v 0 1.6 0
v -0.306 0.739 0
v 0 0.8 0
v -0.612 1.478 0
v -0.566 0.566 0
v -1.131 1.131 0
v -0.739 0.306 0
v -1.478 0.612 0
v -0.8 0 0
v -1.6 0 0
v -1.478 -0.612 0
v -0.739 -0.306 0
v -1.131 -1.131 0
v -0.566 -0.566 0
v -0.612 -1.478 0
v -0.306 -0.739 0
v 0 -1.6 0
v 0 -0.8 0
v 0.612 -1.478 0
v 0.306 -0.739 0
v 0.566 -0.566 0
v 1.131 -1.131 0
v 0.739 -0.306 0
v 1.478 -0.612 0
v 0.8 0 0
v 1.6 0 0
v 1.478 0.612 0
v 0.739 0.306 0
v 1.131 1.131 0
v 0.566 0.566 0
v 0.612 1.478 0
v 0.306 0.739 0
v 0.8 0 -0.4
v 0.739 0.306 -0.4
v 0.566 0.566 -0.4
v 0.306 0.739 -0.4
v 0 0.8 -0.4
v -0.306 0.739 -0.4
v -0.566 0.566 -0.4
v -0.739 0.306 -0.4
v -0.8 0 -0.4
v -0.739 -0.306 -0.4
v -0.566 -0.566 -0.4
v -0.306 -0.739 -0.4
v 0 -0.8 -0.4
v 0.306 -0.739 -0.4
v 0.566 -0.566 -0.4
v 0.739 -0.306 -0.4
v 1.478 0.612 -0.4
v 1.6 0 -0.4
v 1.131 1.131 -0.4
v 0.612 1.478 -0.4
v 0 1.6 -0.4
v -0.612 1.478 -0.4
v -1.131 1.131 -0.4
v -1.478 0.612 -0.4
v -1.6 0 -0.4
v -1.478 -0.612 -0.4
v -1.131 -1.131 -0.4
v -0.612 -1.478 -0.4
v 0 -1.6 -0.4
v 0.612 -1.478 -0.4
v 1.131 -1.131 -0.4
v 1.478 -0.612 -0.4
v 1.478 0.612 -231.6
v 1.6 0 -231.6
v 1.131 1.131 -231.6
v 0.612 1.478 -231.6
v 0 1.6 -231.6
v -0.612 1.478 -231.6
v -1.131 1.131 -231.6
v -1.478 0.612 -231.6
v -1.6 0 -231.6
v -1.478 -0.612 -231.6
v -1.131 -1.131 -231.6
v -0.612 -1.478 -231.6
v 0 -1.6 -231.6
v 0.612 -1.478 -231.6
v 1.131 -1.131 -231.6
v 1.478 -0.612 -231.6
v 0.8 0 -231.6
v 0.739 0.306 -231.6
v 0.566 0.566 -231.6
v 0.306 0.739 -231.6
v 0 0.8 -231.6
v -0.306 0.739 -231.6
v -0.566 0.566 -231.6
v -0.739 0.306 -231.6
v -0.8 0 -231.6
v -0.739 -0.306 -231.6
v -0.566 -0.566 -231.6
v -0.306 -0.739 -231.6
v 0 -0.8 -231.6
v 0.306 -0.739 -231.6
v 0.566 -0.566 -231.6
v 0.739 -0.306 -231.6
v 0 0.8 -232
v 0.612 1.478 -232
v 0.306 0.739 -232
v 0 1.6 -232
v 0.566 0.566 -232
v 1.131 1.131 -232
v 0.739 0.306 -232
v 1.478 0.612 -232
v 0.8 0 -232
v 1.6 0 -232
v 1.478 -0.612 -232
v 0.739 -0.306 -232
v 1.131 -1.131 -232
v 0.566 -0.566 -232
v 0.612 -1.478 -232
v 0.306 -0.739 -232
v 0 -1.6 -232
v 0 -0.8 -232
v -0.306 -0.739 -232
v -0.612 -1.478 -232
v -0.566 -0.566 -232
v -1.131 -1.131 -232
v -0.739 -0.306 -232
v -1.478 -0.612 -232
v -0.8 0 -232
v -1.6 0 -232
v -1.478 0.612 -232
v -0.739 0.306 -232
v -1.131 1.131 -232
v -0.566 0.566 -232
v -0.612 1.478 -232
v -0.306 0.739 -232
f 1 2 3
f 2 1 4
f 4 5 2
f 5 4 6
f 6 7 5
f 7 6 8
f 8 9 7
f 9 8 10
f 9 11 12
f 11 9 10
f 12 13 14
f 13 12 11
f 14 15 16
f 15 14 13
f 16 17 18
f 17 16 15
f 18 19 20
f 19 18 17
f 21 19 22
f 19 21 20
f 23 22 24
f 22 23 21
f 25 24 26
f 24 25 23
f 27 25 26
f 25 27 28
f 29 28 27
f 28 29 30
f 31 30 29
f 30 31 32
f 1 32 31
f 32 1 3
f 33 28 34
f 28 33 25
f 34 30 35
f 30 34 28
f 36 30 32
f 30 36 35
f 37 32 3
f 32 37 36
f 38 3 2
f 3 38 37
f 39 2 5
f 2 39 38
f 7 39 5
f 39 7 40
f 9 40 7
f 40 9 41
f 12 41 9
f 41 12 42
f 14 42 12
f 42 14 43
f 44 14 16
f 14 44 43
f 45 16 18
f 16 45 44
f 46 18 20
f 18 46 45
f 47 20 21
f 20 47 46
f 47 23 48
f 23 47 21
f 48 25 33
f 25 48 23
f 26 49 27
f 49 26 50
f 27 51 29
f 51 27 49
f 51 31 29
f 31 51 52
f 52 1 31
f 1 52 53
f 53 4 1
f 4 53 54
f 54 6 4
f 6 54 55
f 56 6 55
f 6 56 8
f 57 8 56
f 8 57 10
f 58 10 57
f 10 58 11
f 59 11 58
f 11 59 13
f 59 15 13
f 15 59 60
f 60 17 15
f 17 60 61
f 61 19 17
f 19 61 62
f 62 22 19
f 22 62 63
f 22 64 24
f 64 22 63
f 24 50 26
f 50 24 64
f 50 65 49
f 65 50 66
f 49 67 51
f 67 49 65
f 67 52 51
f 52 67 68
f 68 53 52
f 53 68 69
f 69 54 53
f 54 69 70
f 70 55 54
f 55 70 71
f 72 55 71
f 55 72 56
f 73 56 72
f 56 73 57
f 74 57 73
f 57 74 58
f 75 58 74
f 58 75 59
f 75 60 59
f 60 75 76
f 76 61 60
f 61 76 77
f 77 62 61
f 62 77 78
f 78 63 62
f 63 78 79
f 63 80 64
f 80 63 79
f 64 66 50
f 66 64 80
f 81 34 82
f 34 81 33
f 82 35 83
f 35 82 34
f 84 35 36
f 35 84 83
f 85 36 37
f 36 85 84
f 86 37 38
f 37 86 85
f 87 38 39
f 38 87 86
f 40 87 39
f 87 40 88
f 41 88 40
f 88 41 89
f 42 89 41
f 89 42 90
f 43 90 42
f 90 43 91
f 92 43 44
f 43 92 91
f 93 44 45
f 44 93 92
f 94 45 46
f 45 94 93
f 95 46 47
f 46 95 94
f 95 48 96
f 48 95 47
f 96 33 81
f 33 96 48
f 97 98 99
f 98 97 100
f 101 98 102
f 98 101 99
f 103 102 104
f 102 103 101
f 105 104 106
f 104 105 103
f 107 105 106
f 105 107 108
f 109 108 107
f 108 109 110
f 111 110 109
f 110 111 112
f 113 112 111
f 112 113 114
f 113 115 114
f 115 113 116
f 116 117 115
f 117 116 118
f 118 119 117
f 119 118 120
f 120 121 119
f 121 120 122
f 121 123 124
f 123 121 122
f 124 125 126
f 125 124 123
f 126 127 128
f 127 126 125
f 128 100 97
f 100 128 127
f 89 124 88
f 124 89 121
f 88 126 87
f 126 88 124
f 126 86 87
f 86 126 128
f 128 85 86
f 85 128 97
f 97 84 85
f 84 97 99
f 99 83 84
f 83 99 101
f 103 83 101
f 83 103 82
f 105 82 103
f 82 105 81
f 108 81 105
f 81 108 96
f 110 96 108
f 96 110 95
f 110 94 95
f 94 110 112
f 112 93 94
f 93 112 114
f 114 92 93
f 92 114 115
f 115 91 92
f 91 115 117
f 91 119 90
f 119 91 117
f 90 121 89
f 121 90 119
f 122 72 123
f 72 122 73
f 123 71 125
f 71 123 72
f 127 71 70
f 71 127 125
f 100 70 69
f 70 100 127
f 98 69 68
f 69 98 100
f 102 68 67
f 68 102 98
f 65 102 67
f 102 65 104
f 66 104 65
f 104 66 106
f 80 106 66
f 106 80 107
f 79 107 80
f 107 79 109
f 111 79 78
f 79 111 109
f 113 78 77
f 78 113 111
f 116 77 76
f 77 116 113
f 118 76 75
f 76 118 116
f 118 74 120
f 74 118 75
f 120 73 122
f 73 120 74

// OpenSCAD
// file: ../p/4-4ring1.scad
use <../lib.scad>
function ldraw_lib__4_4ring1() = [
// 0 Ring  1 x 1.0
// 0 Name: 4-4ring1.dat
// 0 Author: James Jessiman
// 0 !LDRAW_ORG Primitive UPDATE 2009-01
// 0 !LICENSE Licensed under CC BY 4.0 : see CAreadme.txt
// 
// 0 BFC CERTIFY CCW
  [0,"BFC","CERTIFY"],
  [0,"BFC","CCW"],
// 
// 0 !HISTORY 1998-12-15 [PTadmin] Official Update 1998-10
// 0 !HISTORY 2002-04-08 [BrickCaster] Modified for BFC compliance
// 0 !HISTORY 2002-04-25 [PTadmin] Official Update 2002-02
// 0 !HISTORY 2007-06-24 [PTadmin] Header formatted for Contributor Agreement
// 0 !HISTORY 2008-07-01 [PTadmin] Official Update 2008-01
// 0 !HISTORY 2008-08-26 [cwdee] Switch polygon winding and rename
// 0 !HISTORY 2009-05-02 [PTadmin] Official Update 2009-01
// 
// 
// 4 16 -0.7654 0 1.8478 -0.3827 0 0.9239 0 0 1 0 0 2
  [4,16,-0.7654,0,1.8478,-0.3827,0,0.9239,0,0,1,0,0,2],
// 4 16 -1.4142 0 1.4142 -0.7071 0 0.7071 -0.3827 0 0.9239 -0.7654 0 1.8478
  [4,16,-1.4142,0,1.4142,-0.7071,0,0.7071,-0.3827,0,0.9239,-0.7654,0,1.8478],
// 4 16 -1.8478 0 0.7654 -0.9239 0 0.3827 -0.7071 0 0.7071 -1.4142 0 1.41420
  [4,16,-1.8478,0,0.7654,-0.9239,0,0.3827,-0.7071,0,0.7071,-1.4142,0,1.41420],
// 4 16 -2 0 0 -1 0 0 -0.9239 0 0.3827 -1.8478 0 0.7654
  [4,16,-2,0,0,-1,0,0,-0.9239,0,0.3827,-1.8478,0,0.7654],
// 4 16 -1.8478 0 -0.7654 -0.9239 0 -0.3827 -1 0 0 -2 0 0
  [4,16,-1.8478,0,-0.7654,-0.9239,0,-0.3827,-1,0,0,-2,0,0],
// 4 16 -1.4142 0 -1.4142 -0.7071 0 -0.7071 -0.9239 0 -0.3827 -1.8478 0 -0.7654
  [4,16,-1.4142,0,-1.4142,-0.7071,0,-0.7071,-0.9239,0,-0.3827,-1.8478,0,-0.7654],
// 4 16 -0.7654 0 -1.8478 -0.3827 0 -0.9239 -0.7071 0 -0.7071 -1.4142 0 -1.4142
  [4,16,-0.7654,0,-1.8478,-0.3827,0,-0.9239,-0.7071,0,-0.7071,-1.4142,0,-1.4142],
// 4 16 0 0 -2 0 0 -1 -0.3827 0 -0.9239 -0.7654 0 -1.8478
  [4,16,0,0,-2,0,0,-1,-0.3827,0,-0.9239,-0.7654,0,-1.8478],
// 4 16 0.7654 0 -1.8478 0.3827 0 -0.9239 0 0 -1 0 0 -2
  [4,16,0.7654,0,-1.8478,0.3827,0,-0.9239,0,0,-1,0,0,-2],
// 4 16 1.4142 0 -1.4142 0.7071 0 -0.7071 0.3827 0 -0.9239 0.7654 0 -1.8478
  [4,16,1.4142,0,-1.4142,0.7071,0,-0.7071,0.3827,0,-0.9239,0.7654,0,-1.8478],
// 4 16 1.8478 0 -0.7654 0.9239 0 -0.3827 0.7071 0 -0.7071 1.4142 0 -1.4142
  [4,16,1.8478,0,-0.7654,0.9239,0,-0.3827,0.7071,0,-0.7071,1.4142,0,-1.4142],
// 4 16 2 0 0 1 0 0 0.9239 0 -0.3827 1.8478 0 -0.7654
  [4,16,2,0,0,1,0,0,0.9239,0,-0.3827,1.8478,0,-0.7654],
// 4 16 1.8478 0 0.7654 0.9239 0 0.3827 1 0 0 2 0 0
  [4,16,1.8478,0,0.7654,0.9239,0,0.3827,1,0,0,2,0,0],
// 4 16 1.4142 0 1.4142 0.7071 0 0.7071 0.9239 0 0.3827 1.8478 0 0.7654
  [4,16,1.4142,0,1.4142,0.7071,0,0.7071,0.9239,0,0.3827,1.8478,0,0.7654],
// 4 16 0.7654 0 1.8478 0.3827 0 0.9239 0.7071 0 0.7071 1.4142 0 1.4142
  [4,16,0.7654,0,1.8478,0.3827,0,0.9239,0.7071,0,0.7071,1.4142,0,1.4142],
// 4 16 0 0 2 0 0 1 0.3827 0 0.9239 0.7654 0 1.8478
  [4,16,0,0,2,0,0,1,0.3827,0,0.9239,0.7654,0,1.8478],
// 0
];
module ldraw_lib__4_4ring1(step=0, col=false, unit=2/5, alt=false, line=0.2, solid=!$preview)
    makepoly(ldraw_lib__4_4ring1(), step=step, col=col, unit=unit, alt=alt, line=line, solid=solid);
ldraw_lib__4_4ring1(line=0.2);
// file: ../p/4-4edge.scad
use <../lib.scad>
function ldraw_lib__4_4edge() = [
// 0 Circle 1.0
// 0 Name: 4-4edge.dat
// 0 Author: James Jessiman
// 0 !LDRAW_ORG Primitive UPDATE 2017-01
// 0 !LICENSE Licensed under CC BY 4.0 : see CAreadme.txt
// 
// 0 BFC CERTIFY CCW
  [0,"BFC","CERTIFY"],
  [0,"BFC","CCW"],
// 
// 0 !HISTORY 1998-12-15 [PTadmin] Official Update 1998-10
// 0 !HISTORY 2005-12-28 [PTadmin] Official Update 2005-01
// 0 !HISTORY 2007-06-24 [PTadmin] Header formatted for Contributor Agreement
// 0 !HISTORY 2008-07-01 [PTadmin] Official Update 2008-01
// 0 !HISTORY 2017-01-15 [Steffen] BFCed
// 0 !HISTORY 2017-12-30 [PTadmin] Official Update 2017-01
// 
// 
// 2 24 1 0 0 0.9239 0 0.3827
  [2,24,1,0,0,0.9239,0,0.3827],
// 2 24 0.9239 0 0.3827 0.7071 0 0.7071
  [2,24,0.9239,0,0.3827,0.7071,0,0.7071],
// 2 24 0.7071 0 0.7071 0.3827 0 0.9239
  [2,24,0.7071,0,0.7071,0.3827,0,0.9239],
// 2 24 0.3827 0 0.9239 0 0 1
  [2,24,0.3827,0,0.9239,0,0,1],
// 2 24 0 0 1 -0.3827 0 0.9239
  [2,24,0,0,1,-0.3827,0,0.9239],
// 2 24 -0.3827 0 0.9239 -0.7071 0 0.7071
  [2,24,-0.3827,0,0.9239,-0.7071,0,0.7071],
// 2 24 -0.7071 0 0.7071 -0.9239 0 0.3827
  [2,24,-0.7071,0,0.7071,-0.9239,0,0.3827],
// 2 24 -0.9239 0 0.3827 -1 0 -0
  [2,24,-0.9239,0,0.3827,-1,0,-0],
// 2 24 -1 0 -0 -0.9239 0 -0.3827
  [2,24,-1,0,-0,-0.9239,0,-0.3827],
// 2 24 -0.9239 0 -0.3827 -0.7071 0 -0.7071
  [2,24,-0.9239,0,-0.3827,-0.7071,0,-0.7071],
// 2 24 -0.7071 0 -0.7071 -0.3827 0 -0.9239
  [2,24,-0.7071,0,-0.7071,-0.3827,0,-0.9239],
// 2 24 -0.3827 0 -0.9239 0 0 -1
  [2,24,-0.3827,0,-0.9239,0,0,-1],
// 2 24 0 0 -1 0.3827 0 -0.9239
  [2,24,0,0,-1,0.3827,0,-0.9239],
// 2 24 0.3827 0 -0.9239 0.7071 0 -0.7071
  [2,24,0.3827,0,-0.9239,0.7071,0,-0.7071],
// 2 24 0.7071 0 -0.7071 0.9239 0 -0.3827
  [2,24,0.7071,0,-0.7071,0.9239,0,-0.3827],
// 2 24 0.9239 0 -0.3827 1 0 0
  [2,24,0.9239,0,-0.3827,1,0,0],
];
module ldraw_lib__4_4edge(step=0, col=false, unit=2/5, alt=false, line=0.2, solid=!$preview)
    makepoly(ldraw_lib__4_4edge(), step=step, col=col, unit=unit, alt=alt, line=line, solid=solid);
ldraw_lib__4_4edge(line=0.2);
// file: ../p/4-4cyli.scad
use <../lib.scad>
function ldraw_lib__4_4cyli() = [
// 0 Cylinder 1.0
// 0 Name: 4-4cyli.dat
// 0 Author: James Jessiman
// 0 !LDRAW_ORG Primitive UPDATE 2005-01
// 0 !LICENSE Licensed under CC BY 4.0 : see CAreadme.txt
// 
// 0 BFC CERTIFY CCW
  [0,"BFC","CERTIFY"],
  [0,"BFC","CCW"],
// 
// 0 !HISTORY 1998-12-15 [PTadmin] Official Update 1998-10
// 0 !HISTORY 2002-03-23 [sbliss] Added BFC statement; merged headers from files in distributions LDraw 0.27 and Complete.
// 0 !HISTORY 2002-04-25 [PTadmin] Official Update 2002-02
// 0 !HISTORY 2004-12-14 [guyvivan] BFC CCW
// 0 !HISTORY 2005-12-28 [PTadmin] Official Update 2005-01
// 0 !HISTORY 2007-06-24 [PTadmin] Header formatted for Contributor Agreement
// 0 !HISTORY 2008-07-01 [PTadmin] Official Update 2008-01
// 
// 
// 4 16 1 1 0 0.9239 1 0.3827 0.9239 0 0.3827 1 0 0
  [4,16,1,1,0,0.9239,1,0.3827,0.9239,0,0.3827,1,0,0],
// 5 24 1 0 0 1 1 0 0.9239 0 0.3827 0.9239 0 -0.3827
  [5,24,1,0,0,1,1,0,0.9239,0,0.3827,0.9239,0,-0.3827],
// 4 16 0.9239 1 0.3827 0.7071 1 0.7071 0.7071 0 0.7071 0.9239 0 0.3827
  [4,16,0.9239,1,0.3827,0.7071,1,0.7071,0.7071,0,0.7071,0.9239,0,0.3827],
// 5 24 0.9239 0 0.3827 0.9239 1 0.3827 0.7071 0 0.7071 1 0 0
  [5,24,0.9239,0,0.3827,0.9239,1,0.3827,0.7071,0,0.7071,1,0,0],
// 4 16 0.7071 1 0.7071 0.3827 1 0.9239 0.3827 0 0.9239 0.7071 0 0.7071
  [4,16,0.7071,1,0.7071,0.3827,1,0.9239,0.3827,0,0.9239,0.7071,0,0.7071],
// 5 24 0.7071 0 0.7071 0.7071 1 0.7071 0.3827 0 0.9239 0.9239 0 0.3827
  [5,24,0.7071,0,0.7071,0.7071,1,0.7071,0.3827,0,0.9239,0.9239,0,0.3827],
// 4 16 0.3827 1 0.9239 0 1 1 0 0 1 0.3827 0 0.9239
  [4,16,0.3827,1,0.9239,0,1,1,0,0,1,0.3827,0,0.9239],
// 5 24 0.3827 0 0.9239 0.3827 1 0.9239 0 0 1 0.7071 0 0.7071
  [5,24,0.3827,0,0.9239,0.3827,1,0.9239,0,0,1,0.7071,0,0.7071],
// 4 16 0 1 1 -0.3827 1 0.9239 -0.3827 0 0.9239 0 0 1
  [4,16,0,1,1,-0.3827,1,0.9239,-0.3827,0,0.9239,0,0,1],
// 5 24 0 0 1 0 1 1 -0.3827 0 0.9239 0.3827 0 0.9239
  [5,24,0,0,1,0,1,1,-0.3827,0,0.9239,0.3827,0,0.9239],
// 4 16 -0.3827 1 0.9239 -0.7071 1 0.7071 -0.7071 0 0.7071 -0.3827 0 0.9239
  [4,16,-0.3827,1,0.9239,-0.7071,1,0.7071,-0.7071,0,0.7071,-0.3827,0,0.9239],
// 5 24 -0.3827 0 0.9239 -0.3827 1 0.9239 -0.7071 0 0.7071 0 0 1
  [5,24,-0.3827,0,0.9239,-0.3827,1,0.9239,-0.7071,0,0.7071,0,0,1],
// 4 16 -0.7071 1 0.7071 -0.9239 1 0.3827 -0.9239 0 0.3827 -0.7071 0 0.7071
  [4,16,-0.7071,1,0.7071,-0.9239,1,0.3827,-0.9239,0,0.3827,-0.7071,0,0.7071],
// 5 24 -0.7071 0 0.7071 -0.7071 1 0.7071 -0.9239 0 0.3827 -0.3827 0 0.9239
  [5,24,-0.7071,0,0.7071,-0.7071,1,0.7071,-0.9239,0,0.3827,-0.3827,0,0.9239],
// 4 16 -0.9239 1 0.3827 -1 1 0 -1 0 0 -0.9239 0 0.3827
  [4,16,-0.9239,1,0.3827,-1,1,0,-1,0,0,-0.9239,0,0.3827],
// 5 24 -0.9239 0 0.3827 -0.9239 1 0.3827 -1 0 0 -0.7071 0 0.7071
  [5,24,-0.9239,0,0.3827,-0.9239,1,0.3827,-1,0,0,-0.7071,0,0.7071],
// 4 16 -1 1 0 -0.9239 1 -0.3827 -0.9239 0 -0.3827 -1 0 0
  [4,16,-1,1,0,-0.9239,1,-0.3827,-0.9239,0,-0.3827,-1,0,0],
// 5 24 -1 0 0 -1 1 0 -0.9239 0 -0.3827 -0.9239 0 0.3827
  [5,24,-1,0,0,-1,1,0,-0.9239,0,-0.3827,-0.9239,0,0.3827],
// 4 16 -0.9239 1 -0.3827 -0.7071 1 -0.7071 -0.7071 0 -0.7071 -0.9239 0 -0.3827
  [4,16,-0.9239,1,-0.3827,-0.7071,1,-0.7071,-0.7071,0,-0.7071,-0.9239,0,-0.3827],
// 5 24 -0.9239 0 -0.3827 -0.9239 1 -0.3827 -0.7071 0 -0.7071 -1 0 0
  [5,24,-0.9239,0,-0.3827,-0.9239,1,-0.3827,-0.7071,0,-0.7071,-1,0,0],
// 4 16 -0.7071 1 -0.7071 -0.3827 1 -0.9239 -0.3827 0 -0.9239 -0.7071 0 -0.7071
  [4,16,-0.7071,1,-0.7071,-0.3827,1,-0.9239,-0.3827,0,-0.9239,-0.7071,0,-0.7071],
// 5 24 -0.7071 0 -0.7071 -0.7071 1 -0.7071 -0.3827 0 -0.9239 -0.9239 0 -0.3827
  [5,24,-0.7071,0,-0.7071,-0.7071,1,-0.7071,-0.3827,0,-0.9239,-0.9239,0,-0.3827],
// 4 16 -0.3827 1 -0.9239 0 1 -1 0 0 -1 -0.3827 0 -0.9239
  [4,16,-0.3827,1,-0.9239,0,1,-1,0,0,-1,-0.3827,0,-0.9239],
// 5 24 -0.3827 0 -0.9239 -0.3827 1 -0.9239 0 0 -1 -0.7071 0 -0.7071
  [5,24,-0.3827,0,-0.9239,-0.3827,1,-0.9239,0,0,-1,-0.7071,0,-0.7071],
// 4 16 0 1 -1 0.3827 1 -0.9239 0.3827 0 -0.9239 0 0 -1
  [4,16,0,1,-1,0.3827,1,-0.9239,0.3827,0,-0.9239,0,0,-1],
// 5 24 0 0 -1 0 1 -1 0.3827 0 -0.9239 -0.3827 0 -0.9239
  [5,24,0,0,-1,0,1,-1,0.3827,0,-0.9239,-0.3827,0,-0.9239],
// 4 16 0.3827 1 -0.9239 0.7071 1 -0.7071 0.7071 0 -0.7071 0.3827 0 -0.9239
  [4,16,0.3827,1,-0.9239,0.7071,1,-0.7071,0.7071,0,-0.7071,0.3827,0,-0.9239],
// 5 24 0.3827 0 -0.9239 0.3827 1 -0.9239 0.7071 0 -0.7071 0 0 -1
  [5,24,0.3827,0,-0.9239,0.3827,1,-0.9239,0.7071,0,-0.7071,0,0,-1],
// 4 16 0.7071 1 -0.7071 0.9239 1 -0.3827 0.9239 0 -0.3827 0.7071 0 -0.7071
  [4,16,0.7071,1,-0.7071,0.9239,1,-0.3827,0.9239,0,-0.3827,0.7071,0,-0.7071],
// 5 24 0.7071 0 -0.7071 0.7071 1 -0.7071 0.9239 0 -0.3827 0.3827 0 -0.9239
  [5,24,0.7071,0,-0.7071,0.7071,1,-0.7071,0.9239,0,-0.3827,0.3827,0,-0.9239],
// 4 16 0.9239 1 -0.3827 1 1 0 1 0 0 0.9239 0 -0.3827
  [4,16,0.9239,1,-0.3827,1,1,0,1,0,0,0.9239,0,-0.3827],
// 5 24 0.9239 0 -0.3827 0.9239 1 -0.3827 1 0 0 0.7071 0 -0.7071
  [5,24,0.9239,0,-0.3827,0.9239,1,-0.3827,1,0,0,0.7071,0,-0.7071],
// 0
];
module ldraw_lib__4_4cyli(step=0, col=false, unit=2/5, alt=false, line=0.2, solid=!$preview)
    makepoly(ldraw_lib__4_4cyli(), step=step, col=col, unit=unit, alt=alt, line=line, solid=solid);
ldraw_lib__4_4cyli(line=0.2);
// file: u9053.scad
use <../lib.scad>
use <../p/4-4cyli.scad>
use <../p/4-4edge.scad>
use <../p/4-4ring1.scad>
function ldraw_lib__u9053() = [
// 0 ~Technic Flex-System Hose End
// 0 Name: u9053.dat
// 0 Author: William Howard [WilliamH]
// 0 !LDRAW_ORG Part UPDATE 2011-02
// 0 !LICENSE Licensed under CC BY 2.0 and CC BY 4.0 : see CAreadme.txt
// 
// 0 BFC CERTIFY CCW
  [0,"BFC","CERTIFY"],
  [0,"BFC","CCW"],
// 
// 0 !HISTORY 2011-12-21 [cwdee] Reworked subparting technique
// 0 !HISTORY 2011-12-23 [PTadmin] Renamed from 76
// 0 !HISTORY 2011-12-29 [PTadmin] Official Update 2011-02
// 
// 
// 1 16 0 0 0 2 0 0 0 1 0 0 0 2 4-4ring1.dat
  [1,16,0,0,0,2,0,0,0,1,0,0,0,2, ldraw_lib__4_4ring1()],
// 1 16 0 0 0 2 0 0 0 1 0 0 0 2 4-4edge.dat
  [1,16,0,0,0,2,0,0,0,1,0,0,0,2, ldraw_lib__4_4edge()],
// 0 BFC INVERTNEXT
  [0,"BFC","INVERTNEXT"],
// 1 16 0 0 0 2 0 0 0 1 0 0 0 2 4-4cyli.dat
  [1,16,0,0,0,2,0,0,0,1,0,0,0,2, ldraw_lib__4_4cyli()],
// 1 16 0 0 0 4 0 0 0 1 0 0 0 4 4-4edge.dat
  [1,16,0,0,0,4,0,0,0,1,0,0,0,4, ldraw_lib__4_4edge()],
// 1 16 0 0 0 4 0 0 0 1 0 0 0 4 4-4cyli.dat
  [1,16,0,0,0,4,0,0,0,1,0,0,0,4, ldraw_lib__4_4cyli()],
// 0
];
module ldraw_lib__u9053(step=0, col=false, unit=2/5, alt=false, line=0.2, solid=!$preview)
    makepoly(ldraw_lib__u9053(), step=step, col=col, unit=unit, alt=alt, line=line, solid=solid);
ldraw_lib__u9053(line=0.2);
// file: 77.scad
use <../lib.scad>
use <../p/4-4cyli.scad>
function ldraw_lib__77() = [
// 0 ~Technic Flex-System Hose Segment
// 0 Name: 77.dat
// 0 Author: William Howard [WilliamH]
// 0 !LDRAW_ORG Part UPDATE 2011-02
// 0 !LICENSE Licensed under CC BY 2.0 and CC BY 4.0 : see CAreadme.txt
// 
// 0 BFC CERTIFY CCW
  [0,"BFC","CERTIFY"],
  [0,"BFC","CCW"],
// 
// 0 !HISTORY 2011-12-21 [cwdee] Reworked subparting technique
// 0 !HISTORY 2011-12-29 [PTadmin] Official Update 2011-02
// 
// 
// 1 16 0 0 0 4 0 0 0 1 0 0 0 4 4-4cyli.dat
  [1,16,0,0,0,4,0,0,0,1,0,0,0,4, ldraw_lib__4_4cyli()],
// 0 BFC INVERTNEXT
  [0,"BFC","INVERTNEXT"],
// 1 16 0 0 0 2 0 0 0 1 0 0 0 2 4-4cyli.dat
  [1,16,0,0,0,2,0,0,0,1,0,0,0,2, ldraw_lib__4_4cyli()],
// 0
];
module ldraw_lib__77(step=0, col=false, unit=2/5, alt=false, line=0.2, solid=!$preview)
    makepoly(ldraw_lib__77(), step=step, col=col, unit=unit, alt=alt, line=line, solid=solid);
ldraw_lib__77(line=0.2);
// main file
use <../lib.scad>
use <77.scad>
use <u9053.scad>
function ldraw_lib__76389() = [
// 0 Technic Flex-System Hose 29L (580LDU)
// 0 Name: 76389.dat
// 0 Author: Tim Gould [timgould]
// 0 !LDRAW_ORG Part UPDATE 2011-02
// 0 !LICENSE Licensed under CC BY 4.0 : see CAreadme.txt
// 
// 0 BFC CERTIFY CCW
  [0,"BFC","CERTIFY"],
  [0,"BFC","CCW"],
// 
// 0 !KEYWORDS bar, BrickLink 75c29, Rebrickable 75c29, tube
// 
// 0 !HISTORY 2011-12-29 [PTadmin] Official Update 2011-02
// 
// 
// 1 16 0 0 0 1 0 0 0 1 0 0 0 1 u9053.dat
  [1,16,0,0,0,1,0,0,0,1,0,0,0,1, ldraw_lib__u9053()],
// 1 16 0 1 0 1 0 0 0 578 0 0 0 1 77.dat
  [1,16,0,1,0,1,0,0,0,578,0,0,0,1, ldraw_lib__77()],
// 1 16 0 580 0 -1 0 0 0 -1 0 0 0 1 u9053.dat
  [1,16,0,580,0,-1,0,0,0,-1,0,0,0,1, ldraw_lib__u9053()],
];
module ldraw_lib__76389(step=0, col=false, unit=2/5, alt=false, line=0.2, solid=!$preview)
    makepoly(ldraw_lib__76389(), step=step, col=col, unit=unit, alt=alt, line=line, solid=solid);
ldraw_lib__76389(line=0.2);
